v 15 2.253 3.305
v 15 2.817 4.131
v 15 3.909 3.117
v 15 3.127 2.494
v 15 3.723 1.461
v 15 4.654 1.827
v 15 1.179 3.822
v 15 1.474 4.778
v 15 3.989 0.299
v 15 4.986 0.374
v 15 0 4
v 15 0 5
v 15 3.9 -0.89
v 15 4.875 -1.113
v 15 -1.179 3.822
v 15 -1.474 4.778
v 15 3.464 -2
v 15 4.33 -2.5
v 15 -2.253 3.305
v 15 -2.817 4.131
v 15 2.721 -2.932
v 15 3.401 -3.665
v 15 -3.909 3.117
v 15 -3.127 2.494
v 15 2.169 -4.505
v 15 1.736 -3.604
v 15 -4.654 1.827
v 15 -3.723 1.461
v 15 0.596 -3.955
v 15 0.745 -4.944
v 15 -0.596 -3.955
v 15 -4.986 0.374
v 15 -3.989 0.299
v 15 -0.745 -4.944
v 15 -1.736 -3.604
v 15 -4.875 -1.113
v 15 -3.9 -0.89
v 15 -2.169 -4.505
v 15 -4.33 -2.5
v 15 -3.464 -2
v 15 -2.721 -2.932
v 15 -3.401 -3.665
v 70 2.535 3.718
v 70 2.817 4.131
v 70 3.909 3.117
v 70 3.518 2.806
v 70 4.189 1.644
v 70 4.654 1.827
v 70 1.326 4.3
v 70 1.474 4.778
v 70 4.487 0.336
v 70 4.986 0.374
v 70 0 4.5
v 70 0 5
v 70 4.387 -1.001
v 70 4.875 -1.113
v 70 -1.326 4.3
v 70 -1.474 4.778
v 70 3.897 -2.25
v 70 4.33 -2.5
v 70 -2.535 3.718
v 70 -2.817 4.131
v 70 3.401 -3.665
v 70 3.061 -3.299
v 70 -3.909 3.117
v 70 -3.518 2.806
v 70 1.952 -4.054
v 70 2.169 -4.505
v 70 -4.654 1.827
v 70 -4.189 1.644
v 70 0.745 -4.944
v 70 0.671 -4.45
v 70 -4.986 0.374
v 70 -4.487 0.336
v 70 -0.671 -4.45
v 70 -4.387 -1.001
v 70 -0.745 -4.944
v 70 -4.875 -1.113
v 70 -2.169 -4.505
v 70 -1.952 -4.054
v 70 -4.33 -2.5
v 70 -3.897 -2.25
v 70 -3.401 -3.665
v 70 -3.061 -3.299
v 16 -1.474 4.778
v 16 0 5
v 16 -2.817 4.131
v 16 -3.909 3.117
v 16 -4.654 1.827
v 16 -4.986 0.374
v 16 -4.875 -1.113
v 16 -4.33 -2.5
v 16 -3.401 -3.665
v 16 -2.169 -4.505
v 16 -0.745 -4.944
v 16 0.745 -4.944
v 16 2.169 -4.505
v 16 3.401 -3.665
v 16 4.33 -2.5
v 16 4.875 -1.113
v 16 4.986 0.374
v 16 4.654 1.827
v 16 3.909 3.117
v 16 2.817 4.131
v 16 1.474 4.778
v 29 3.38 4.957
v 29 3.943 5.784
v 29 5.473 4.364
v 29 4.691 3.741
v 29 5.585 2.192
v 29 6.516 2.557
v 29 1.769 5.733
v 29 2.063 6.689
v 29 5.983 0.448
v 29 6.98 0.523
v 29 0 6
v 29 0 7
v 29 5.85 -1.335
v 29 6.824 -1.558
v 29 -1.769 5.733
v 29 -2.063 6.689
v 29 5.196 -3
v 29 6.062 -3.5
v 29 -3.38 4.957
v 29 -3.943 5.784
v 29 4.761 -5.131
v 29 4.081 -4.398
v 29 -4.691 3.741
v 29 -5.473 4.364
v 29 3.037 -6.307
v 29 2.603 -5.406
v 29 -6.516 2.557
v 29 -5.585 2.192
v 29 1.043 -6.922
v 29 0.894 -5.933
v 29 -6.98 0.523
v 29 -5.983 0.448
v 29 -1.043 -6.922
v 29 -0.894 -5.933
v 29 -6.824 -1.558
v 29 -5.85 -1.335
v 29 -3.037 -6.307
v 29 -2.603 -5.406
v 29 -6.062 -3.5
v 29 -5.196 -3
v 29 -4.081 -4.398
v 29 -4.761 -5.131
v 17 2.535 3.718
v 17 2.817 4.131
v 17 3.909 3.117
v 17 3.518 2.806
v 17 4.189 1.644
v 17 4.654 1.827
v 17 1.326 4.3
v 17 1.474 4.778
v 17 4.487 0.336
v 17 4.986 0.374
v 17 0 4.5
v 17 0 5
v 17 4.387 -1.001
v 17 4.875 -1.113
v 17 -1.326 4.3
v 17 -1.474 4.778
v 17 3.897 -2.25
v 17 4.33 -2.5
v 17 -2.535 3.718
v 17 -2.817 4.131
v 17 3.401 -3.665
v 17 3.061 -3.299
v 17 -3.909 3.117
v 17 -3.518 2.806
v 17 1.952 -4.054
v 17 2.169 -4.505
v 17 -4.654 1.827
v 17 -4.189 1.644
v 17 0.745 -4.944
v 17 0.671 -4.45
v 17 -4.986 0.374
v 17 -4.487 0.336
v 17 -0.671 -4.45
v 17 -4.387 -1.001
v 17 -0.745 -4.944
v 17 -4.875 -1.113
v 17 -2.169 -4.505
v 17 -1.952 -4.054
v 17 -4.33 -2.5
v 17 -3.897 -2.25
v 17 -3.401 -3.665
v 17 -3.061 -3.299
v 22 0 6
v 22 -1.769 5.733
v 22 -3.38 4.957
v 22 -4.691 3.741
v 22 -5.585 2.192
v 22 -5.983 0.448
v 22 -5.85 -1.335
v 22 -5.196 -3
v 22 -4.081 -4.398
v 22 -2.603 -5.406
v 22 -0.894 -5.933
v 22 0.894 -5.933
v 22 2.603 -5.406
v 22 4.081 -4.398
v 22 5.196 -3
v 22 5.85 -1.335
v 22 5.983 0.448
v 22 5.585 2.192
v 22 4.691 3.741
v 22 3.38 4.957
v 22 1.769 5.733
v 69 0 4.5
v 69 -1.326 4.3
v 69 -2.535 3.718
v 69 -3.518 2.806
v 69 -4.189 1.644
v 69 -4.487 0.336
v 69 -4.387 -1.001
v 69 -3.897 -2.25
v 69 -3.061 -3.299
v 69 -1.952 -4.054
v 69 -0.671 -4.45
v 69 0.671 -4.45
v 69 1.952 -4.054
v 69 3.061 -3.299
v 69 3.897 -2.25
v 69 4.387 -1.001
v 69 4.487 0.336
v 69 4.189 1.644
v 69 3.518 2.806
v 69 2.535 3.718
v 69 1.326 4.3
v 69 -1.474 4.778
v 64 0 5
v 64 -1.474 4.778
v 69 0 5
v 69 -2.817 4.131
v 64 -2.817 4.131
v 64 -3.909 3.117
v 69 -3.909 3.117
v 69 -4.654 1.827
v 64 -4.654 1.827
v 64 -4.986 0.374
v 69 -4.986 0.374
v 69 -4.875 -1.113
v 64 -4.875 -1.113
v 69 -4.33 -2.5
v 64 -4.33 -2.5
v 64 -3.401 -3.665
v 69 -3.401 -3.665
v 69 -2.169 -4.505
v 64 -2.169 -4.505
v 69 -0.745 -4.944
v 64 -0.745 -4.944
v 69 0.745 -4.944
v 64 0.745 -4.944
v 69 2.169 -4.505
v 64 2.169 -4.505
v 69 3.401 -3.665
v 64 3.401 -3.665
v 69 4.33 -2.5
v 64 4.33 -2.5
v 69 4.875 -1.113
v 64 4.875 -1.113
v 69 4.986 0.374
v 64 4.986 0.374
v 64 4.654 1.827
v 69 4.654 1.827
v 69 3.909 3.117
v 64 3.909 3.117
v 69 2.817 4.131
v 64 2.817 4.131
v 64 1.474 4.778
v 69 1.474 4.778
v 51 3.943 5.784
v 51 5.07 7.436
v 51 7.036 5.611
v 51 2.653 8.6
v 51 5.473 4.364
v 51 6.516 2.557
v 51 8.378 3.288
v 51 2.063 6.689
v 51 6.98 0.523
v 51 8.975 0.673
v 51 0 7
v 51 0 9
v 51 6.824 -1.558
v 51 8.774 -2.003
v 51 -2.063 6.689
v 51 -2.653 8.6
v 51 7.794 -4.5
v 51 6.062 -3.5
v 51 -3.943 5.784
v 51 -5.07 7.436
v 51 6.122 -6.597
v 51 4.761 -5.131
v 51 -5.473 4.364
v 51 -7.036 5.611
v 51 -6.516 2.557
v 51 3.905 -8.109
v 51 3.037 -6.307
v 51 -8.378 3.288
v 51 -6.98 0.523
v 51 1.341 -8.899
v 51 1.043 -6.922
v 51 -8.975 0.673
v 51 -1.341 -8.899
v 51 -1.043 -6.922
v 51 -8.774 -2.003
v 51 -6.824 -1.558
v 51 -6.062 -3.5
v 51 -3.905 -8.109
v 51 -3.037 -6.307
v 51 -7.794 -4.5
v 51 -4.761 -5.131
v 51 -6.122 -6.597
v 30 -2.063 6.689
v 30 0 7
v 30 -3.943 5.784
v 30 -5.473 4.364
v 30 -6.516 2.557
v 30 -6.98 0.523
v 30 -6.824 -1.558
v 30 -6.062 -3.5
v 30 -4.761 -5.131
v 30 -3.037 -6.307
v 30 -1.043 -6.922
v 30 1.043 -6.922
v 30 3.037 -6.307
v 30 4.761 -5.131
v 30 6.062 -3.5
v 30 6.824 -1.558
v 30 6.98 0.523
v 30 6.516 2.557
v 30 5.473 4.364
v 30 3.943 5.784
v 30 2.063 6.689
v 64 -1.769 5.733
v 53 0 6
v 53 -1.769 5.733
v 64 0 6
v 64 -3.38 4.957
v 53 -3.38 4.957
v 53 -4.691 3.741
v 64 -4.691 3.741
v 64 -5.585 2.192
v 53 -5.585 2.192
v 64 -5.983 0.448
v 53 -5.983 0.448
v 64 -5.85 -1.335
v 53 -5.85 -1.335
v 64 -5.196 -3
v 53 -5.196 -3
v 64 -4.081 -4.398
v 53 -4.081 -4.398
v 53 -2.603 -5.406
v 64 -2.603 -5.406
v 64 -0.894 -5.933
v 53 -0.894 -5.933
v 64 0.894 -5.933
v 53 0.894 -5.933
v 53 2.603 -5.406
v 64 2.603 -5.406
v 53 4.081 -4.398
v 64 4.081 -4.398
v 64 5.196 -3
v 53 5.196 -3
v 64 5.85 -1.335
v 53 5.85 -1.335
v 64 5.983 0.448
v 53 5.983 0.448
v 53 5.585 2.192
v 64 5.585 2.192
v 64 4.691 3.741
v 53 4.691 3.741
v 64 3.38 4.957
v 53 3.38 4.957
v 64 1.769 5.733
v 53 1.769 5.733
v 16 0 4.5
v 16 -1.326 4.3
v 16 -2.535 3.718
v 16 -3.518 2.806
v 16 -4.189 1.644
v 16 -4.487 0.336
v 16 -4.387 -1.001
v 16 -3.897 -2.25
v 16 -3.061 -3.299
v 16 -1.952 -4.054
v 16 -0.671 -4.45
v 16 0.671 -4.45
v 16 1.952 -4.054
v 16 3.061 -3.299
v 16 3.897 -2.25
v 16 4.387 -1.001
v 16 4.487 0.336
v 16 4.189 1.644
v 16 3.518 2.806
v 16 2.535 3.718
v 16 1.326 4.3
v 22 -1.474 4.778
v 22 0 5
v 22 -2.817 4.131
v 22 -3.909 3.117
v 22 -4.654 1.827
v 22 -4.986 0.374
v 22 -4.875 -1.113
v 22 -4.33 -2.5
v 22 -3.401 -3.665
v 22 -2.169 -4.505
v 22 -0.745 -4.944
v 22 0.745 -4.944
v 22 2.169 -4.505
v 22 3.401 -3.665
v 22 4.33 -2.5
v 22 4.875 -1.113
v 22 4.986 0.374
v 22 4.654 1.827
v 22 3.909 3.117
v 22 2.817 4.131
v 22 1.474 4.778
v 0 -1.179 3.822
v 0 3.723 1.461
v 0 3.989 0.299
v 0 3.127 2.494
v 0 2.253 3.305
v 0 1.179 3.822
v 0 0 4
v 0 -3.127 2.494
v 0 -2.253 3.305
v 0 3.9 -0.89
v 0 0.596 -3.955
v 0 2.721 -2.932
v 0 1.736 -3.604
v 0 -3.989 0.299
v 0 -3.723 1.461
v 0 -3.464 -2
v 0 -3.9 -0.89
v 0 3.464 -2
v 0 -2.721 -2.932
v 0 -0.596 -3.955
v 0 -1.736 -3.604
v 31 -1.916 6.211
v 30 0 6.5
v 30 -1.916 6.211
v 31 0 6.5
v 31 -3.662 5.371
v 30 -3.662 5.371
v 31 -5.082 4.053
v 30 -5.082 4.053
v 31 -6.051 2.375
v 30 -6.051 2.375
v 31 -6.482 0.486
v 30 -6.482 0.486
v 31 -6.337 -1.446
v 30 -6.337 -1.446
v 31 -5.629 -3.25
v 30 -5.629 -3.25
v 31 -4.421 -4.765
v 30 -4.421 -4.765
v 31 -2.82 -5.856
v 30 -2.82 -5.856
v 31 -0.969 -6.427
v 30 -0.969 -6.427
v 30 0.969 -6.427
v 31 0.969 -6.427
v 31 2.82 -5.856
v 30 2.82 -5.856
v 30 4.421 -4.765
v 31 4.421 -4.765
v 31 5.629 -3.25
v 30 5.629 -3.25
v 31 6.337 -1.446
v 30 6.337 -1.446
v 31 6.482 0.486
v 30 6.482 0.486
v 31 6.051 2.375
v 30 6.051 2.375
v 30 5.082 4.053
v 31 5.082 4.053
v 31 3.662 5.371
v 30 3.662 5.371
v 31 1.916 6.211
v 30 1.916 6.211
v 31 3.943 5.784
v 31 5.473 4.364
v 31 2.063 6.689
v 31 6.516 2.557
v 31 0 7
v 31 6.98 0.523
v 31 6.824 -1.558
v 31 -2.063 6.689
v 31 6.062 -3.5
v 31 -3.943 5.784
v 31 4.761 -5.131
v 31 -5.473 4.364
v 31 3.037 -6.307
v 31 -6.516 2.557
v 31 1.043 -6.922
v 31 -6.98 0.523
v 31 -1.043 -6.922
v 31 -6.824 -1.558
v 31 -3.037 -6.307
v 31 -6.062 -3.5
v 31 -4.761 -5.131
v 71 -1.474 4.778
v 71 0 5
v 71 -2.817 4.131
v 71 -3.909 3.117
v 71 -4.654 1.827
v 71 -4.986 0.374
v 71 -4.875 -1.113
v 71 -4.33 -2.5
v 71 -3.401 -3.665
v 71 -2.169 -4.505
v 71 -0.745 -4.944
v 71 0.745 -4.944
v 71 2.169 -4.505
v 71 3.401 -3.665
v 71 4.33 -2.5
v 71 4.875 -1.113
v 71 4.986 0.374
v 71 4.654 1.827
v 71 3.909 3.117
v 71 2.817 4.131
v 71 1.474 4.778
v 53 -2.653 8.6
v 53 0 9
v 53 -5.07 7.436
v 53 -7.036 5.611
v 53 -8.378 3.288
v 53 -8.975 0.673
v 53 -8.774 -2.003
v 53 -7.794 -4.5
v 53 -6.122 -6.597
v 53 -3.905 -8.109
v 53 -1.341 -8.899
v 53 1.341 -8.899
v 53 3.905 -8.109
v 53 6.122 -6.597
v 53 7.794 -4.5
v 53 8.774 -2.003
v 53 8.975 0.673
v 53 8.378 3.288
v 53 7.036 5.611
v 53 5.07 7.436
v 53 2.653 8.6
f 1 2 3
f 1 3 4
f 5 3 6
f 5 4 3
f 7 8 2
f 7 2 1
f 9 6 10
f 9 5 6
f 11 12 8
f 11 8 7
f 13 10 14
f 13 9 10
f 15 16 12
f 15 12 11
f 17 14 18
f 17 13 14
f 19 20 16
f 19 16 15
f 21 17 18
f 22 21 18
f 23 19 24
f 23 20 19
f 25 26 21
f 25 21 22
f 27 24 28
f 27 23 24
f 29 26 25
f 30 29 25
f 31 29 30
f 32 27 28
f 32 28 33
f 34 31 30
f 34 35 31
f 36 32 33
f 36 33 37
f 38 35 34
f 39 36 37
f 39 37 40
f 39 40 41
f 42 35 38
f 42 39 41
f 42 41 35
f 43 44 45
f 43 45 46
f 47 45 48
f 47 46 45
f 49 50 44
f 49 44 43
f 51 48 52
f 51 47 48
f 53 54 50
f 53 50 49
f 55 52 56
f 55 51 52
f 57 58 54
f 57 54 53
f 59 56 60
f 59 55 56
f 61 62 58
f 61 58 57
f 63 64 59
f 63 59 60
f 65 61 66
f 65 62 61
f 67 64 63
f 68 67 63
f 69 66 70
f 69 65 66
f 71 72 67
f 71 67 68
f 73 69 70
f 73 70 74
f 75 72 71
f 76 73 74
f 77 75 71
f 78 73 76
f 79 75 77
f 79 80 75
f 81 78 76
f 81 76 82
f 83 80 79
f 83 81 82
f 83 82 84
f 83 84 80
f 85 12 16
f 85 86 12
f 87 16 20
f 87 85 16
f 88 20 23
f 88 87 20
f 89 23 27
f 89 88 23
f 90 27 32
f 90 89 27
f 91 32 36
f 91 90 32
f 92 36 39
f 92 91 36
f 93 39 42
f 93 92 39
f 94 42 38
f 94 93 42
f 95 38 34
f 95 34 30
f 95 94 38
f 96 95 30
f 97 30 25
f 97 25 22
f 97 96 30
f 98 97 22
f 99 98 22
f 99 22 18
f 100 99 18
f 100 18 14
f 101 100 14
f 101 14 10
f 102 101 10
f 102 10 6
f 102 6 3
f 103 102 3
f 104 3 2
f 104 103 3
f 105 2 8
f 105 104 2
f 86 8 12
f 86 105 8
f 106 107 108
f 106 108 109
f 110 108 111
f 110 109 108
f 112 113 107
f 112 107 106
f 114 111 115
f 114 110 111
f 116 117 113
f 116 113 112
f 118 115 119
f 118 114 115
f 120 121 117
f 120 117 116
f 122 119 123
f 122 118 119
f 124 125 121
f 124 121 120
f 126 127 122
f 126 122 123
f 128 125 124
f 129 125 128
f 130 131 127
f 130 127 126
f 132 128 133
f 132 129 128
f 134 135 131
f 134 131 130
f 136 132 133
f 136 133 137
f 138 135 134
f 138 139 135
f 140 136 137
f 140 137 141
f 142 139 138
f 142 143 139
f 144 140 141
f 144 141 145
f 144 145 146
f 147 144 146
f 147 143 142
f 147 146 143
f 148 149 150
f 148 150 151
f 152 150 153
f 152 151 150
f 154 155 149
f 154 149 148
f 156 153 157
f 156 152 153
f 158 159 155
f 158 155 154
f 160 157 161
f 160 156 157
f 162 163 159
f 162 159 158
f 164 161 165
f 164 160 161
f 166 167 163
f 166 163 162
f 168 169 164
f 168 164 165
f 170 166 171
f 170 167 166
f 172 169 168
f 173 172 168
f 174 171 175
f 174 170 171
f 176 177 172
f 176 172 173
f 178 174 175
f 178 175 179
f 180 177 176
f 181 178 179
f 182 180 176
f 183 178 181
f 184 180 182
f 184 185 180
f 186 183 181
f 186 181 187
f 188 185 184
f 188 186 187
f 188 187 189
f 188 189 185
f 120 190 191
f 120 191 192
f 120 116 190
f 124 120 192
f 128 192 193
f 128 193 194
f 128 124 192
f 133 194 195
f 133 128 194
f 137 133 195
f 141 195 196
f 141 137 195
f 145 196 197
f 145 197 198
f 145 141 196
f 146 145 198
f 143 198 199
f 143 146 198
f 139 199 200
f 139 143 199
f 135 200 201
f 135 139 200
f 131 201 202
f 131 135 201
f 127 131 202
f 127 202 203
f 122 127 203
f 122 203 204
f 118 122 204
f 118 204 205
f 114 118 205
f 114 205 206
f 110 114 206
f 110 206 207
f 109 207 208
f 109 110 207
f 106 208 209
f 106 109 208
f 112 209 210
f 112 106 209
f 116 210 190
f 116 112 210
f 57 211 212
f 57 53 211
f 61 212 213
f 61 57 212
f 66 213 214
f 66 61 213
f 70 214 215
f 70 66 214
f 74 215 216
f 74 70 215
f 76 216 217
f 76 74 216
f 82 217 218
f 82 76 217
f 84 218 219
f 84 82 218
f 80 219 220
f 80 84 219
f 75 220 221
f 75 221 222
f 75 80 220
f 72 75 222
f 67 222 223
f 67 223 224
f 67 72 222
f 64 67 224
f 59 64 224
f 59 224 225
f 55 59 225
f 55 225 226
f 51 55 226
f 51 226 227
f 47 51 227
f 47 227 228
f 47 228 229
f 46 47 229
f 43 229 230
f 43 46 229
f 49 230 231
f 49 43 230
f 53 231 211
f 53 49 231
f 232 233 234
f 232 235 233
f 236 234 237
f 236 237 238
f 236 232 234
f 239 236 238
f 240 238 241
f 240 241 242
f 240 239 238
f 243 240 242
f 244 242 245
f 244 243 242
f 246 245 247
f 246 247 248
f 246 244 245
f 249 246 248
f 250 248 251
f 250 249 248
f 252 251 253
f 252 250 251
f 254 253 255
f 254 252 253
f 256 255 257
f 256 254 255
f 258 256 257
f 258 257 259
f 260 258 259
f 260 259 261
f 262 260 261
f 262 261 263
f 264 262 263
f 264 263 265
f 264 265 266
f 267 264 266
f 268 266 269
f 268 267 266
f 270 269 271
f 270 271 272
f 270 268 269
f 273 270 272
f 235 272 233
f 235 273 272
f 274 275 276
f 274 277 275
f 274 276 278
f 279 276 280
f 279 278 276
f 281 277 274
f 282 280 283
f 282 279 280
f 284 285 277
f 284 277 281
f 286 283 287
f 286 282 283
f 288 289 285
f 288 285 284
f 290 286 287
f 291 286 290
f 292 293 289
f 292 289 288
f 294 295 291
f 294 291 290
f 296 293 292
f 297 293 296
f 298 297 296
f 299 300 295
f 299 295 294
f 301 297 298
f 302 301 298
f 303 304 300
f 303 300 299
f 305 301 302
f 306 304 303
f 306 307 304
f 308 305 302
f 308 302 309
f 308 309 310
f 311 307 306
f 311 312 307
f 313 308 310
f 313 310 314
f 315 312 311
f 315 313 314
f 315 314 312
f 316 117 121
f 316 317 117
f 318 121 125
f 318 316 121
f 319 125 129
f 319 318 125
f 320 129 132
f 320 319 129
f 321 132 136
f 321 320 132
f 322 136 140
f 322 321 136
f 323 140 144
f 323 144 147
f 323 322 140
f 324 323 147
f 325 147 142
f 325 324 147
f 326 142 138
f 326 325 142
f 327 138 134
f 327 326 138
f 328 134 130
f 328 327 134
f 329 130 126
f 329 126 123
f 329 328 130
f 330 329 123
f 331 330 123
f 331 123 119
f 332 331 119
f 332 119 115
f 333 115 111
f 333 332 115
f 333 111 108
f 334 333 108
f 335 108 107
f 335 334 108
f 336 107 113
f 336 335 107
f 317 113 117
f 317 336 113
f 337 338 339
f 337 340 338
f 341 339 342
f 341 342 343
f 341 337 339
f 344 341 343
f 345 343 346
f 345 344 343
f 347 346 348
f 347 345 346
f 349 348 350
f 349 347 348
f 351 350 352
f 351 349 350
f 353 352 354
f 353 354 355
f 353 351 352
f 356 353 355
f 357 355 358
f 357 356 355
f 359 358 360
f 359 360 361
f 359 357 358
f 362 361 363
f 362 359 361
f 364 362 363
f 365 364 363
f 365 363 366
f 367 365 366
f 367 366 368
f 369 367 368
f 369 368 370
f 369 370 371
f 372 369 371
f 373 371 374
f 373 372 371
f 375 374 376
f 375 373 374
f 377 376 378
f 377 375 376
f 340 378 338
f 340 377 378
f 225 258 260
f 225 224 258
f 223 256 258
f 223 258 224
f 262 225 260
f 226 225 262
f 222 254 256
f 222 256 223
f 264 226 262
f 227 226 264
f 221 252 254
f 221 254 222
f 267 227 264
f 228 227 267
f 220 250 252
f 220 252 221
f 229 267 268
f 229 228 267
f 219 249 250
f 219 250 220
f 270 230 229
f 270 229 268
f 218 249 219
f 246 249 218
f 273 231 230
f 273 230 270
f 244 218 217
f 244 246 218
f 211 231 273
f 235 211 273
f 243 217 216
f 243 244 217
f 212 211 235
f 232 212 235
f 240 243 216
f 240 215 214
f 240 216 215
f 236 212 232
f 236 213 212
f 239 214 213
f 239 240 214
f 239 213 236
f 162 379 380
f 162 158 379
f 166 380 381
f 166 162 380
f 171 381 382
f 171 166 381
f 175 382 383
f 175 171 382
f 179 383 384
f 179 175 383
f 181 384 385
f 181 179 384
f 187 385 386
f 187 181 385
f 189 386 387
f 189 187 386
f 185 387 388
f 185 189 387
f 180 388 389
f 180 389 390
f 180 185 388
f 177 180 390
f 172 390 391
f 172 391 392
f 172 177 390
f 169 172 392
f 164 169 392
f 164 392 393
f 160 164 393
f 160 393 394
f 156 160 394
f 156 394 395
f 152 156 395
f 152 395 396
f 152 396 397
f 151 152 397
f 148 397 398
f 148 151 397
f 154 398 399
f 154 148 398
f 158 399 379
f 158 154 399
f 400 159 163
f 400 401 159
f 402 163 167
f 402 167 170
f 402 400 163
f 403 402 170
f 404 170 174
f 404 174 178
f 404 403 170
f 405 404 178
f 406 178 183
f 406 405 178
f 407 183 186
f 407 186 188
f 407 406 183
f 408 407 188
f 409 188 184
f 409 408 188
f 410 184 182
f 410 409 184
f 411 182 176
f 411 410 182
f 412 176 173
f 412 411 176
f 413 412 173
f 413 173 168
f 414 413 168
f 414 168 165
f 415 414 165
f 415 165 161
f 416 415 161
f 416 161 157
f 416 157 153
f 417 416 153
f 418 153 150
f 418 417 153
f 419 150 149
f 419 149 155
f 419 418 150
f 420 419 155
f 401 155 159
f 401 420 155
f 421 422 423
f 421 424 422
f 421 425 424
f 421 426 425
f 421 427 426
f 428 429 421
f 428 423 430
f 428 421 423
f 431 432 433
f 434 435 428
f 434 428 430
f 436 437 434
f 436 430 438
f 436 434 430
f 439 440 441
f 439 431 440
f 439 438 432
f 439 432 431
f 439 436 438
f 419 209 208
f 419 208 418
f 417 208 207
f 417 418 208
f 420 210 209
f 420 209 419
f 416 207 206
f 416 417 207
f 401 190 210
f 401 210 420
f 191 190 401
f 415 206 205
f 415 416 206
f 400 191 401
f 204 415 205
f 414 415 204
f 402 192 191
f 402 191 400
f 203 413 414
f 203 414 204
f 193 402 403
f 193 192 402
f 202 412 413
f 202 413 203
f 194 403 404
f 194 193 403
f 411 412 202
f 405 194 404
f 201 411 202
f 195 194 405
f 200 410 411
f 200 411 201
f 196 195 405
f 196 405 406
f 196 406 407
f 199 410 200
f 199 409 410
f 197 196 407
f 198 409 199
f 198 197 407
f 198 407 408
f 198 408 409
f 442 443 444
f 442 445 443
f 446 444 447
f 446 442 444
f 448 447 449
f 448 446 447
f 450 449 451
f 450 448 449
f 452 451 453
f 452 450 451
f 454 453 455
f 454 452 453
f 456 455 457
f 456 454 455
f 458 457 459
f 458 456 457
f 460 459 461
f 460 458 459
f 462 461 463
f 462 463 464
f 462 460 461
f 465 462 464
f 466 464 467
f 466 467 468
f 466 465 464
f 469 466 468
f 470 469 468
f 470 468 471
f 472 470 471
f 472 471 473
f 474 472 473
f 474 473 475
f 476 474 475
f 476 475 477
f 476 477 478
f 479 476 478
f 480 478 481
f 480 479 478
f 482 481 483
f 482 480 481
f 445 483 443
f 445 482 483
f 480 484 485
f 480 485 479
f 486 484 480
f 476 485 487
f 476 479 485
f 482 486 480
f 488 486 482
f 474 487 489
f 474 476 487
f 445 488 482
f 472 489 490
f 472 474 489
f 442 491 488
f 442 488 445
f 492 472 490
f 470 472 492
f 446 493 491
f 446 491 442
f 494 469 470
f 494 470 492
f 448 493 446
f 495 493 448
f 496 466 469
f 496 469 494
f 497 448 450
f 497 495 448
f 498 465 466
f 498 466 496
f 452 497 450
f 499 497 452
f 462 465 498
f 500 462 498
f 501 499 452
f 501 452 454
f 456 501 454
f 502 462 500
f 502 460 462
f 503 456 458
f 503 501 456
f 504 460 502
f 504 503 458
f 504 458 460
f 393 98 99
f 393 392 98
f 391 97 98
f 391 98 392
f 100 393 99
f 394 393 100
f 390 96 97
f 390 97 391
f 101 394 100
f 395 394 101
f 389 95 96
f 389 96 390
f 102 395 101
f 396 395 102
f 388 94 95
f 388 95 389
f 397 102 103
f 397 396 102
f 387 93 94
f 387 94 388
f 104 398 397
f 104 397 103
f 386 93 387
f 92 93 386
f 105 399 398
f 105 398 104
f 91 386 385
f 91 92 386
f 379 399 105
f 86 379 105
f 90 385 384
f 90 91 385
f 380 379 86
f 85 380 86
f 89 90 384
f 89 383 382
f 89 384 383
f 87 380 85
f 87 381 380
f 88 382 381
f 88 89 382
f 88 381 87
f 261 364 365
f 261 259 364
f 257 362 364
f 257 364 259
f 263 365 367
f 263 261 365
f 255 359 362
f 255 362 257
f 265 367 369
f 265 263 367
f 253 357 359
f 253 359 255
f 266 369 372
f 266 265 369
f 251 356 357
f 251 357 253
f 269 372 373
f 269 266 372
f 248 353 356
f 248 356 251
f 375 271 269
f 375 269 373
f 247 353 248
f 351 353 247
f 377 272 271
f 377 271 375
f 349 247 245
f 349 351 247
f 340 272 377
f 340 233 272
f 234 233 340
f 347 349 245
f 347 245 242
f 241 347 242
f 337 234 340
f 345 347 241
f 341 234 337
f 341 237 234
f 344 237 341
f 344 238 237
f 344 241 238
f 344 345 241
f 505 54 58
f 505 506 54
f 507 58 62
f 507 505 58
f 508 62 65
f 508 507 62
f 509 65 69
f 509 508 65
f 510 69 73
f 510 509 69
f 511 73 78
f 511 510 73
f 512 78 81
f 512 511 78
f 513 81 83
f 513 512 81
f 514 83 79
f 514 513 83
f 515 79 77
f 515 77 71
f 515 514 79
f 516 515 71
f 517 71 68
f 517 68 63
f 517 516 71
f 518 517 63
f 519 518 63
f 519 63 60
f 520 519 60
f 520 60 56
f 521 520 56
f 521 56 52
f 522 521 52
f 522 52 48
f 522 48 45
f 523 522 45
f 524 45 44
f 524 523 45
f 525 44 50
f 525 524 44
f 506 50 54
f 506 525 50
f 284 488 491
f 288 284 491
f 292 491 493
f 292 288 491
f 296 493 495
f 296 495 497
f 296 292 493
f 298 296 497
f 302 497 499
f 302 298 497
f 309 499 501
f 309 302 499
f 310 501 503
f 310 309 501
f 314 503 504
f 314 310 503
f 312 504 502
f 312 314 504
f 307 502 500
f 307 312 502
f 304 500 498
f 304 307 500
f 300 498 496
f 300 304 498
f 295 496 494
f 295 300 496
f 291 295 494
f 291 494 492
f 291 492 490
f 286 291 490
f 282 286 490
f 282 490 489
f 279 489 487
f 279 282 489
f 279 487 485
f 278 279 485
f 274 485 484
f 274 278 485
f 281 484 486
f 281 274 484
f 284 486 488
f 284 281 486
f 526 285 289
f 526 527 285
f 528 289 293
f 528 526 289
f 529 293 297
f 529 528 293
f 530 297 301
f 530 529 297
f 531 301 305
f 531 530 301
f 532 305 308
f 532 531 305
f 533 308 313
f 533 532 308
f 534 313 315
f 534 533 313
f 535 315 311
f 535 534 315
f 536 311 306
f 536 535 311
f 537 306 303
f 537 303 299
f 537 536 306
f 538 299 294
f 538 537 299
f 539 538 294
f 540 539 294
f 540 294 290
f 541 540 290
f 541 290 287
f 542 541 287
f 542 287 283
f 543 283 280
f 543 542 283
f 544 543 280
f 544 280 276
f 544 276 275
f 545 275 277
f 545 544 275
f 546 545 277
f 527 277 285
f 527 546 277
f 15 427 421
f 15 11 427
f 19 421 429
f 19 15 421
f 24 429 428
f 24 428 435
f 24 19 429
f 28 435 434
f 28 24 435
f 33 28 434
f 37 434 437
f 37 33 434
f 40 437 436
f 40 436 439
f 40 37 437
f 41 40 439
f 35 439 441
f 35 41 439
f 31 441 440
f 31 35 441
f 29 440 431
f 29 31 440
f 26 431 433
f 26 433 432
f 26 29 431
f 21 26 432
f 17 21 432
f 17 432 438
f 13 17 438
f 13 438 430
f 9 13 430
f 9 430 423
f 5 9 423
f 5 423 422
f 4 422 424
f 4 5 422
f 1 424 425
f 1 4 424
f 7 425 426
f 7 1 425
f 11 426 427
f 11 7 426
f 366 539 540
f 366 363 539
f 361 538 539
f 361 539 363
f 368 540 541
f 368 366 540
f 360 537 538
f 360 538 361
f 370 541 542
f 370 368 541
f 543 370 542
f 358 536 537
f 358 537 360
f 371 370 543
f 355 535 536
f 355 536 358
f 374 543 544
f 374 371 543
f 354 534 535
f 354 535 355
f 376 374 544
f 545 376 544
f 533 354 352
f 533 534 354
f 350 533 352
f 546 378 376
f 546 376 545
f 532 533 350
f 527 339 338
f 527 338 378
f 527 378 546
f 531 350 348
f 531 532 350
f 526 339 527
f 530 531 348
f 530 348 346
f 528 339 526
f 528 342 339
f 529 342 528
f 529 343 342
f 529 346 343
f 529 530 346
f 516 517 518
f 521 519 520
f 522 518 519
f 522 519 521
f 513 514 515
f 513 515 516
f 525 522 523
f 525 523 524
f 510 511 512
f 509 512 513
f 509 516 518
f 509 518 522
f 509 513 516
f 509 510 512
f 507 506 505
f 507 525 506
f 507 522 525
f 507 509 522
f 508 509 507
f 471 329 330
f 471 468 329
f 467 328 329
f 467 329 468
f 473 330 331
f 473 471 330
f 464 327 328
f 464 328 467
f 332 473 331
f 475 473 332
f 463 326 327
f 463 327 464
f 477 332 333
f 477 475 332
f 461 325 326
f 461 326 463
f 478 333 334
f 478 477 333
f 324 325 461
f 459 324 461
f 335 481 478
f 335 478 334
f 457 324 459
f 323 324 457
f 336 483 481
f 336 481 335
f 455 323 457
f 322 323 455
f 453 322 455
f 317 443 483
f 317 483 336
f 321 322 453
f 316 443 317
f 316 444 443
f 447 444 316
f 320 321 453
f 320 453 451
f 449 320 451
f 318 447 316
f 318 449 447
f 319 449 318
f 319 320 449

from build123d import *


with BuildPart() as part:
    # 草图1 → 旋转1 (revolve)
    with BuildSketch(Plane.XY, mode=Mode.PRIVATE) as revolve_1_sk:
        Polygon((0, 0), (0, 4), (15, 4), (15, 5), (16, 5), (16, 4.5), (17, 4.5), (17, 5), (22, 5), (22, 6), (29, 6), (29, 7), (30, 7), (30, 6.5), (31, 6.5), (31, 7), (51, 7), (51, 9), (53, 9), (53, 6), (64, 6), (64, 5), (69, 5), (69, 4.5), (70, 4.5), (70, 5), (71, 5), (71, 0), align=None)
    revolve(revolve_1_sk.sketch.rotate(Axis((0, 0, 0), (1, 0, 0)), 90), axis=Axis((0, 0, 0), (1, 0, 0)))


solid = part.part
